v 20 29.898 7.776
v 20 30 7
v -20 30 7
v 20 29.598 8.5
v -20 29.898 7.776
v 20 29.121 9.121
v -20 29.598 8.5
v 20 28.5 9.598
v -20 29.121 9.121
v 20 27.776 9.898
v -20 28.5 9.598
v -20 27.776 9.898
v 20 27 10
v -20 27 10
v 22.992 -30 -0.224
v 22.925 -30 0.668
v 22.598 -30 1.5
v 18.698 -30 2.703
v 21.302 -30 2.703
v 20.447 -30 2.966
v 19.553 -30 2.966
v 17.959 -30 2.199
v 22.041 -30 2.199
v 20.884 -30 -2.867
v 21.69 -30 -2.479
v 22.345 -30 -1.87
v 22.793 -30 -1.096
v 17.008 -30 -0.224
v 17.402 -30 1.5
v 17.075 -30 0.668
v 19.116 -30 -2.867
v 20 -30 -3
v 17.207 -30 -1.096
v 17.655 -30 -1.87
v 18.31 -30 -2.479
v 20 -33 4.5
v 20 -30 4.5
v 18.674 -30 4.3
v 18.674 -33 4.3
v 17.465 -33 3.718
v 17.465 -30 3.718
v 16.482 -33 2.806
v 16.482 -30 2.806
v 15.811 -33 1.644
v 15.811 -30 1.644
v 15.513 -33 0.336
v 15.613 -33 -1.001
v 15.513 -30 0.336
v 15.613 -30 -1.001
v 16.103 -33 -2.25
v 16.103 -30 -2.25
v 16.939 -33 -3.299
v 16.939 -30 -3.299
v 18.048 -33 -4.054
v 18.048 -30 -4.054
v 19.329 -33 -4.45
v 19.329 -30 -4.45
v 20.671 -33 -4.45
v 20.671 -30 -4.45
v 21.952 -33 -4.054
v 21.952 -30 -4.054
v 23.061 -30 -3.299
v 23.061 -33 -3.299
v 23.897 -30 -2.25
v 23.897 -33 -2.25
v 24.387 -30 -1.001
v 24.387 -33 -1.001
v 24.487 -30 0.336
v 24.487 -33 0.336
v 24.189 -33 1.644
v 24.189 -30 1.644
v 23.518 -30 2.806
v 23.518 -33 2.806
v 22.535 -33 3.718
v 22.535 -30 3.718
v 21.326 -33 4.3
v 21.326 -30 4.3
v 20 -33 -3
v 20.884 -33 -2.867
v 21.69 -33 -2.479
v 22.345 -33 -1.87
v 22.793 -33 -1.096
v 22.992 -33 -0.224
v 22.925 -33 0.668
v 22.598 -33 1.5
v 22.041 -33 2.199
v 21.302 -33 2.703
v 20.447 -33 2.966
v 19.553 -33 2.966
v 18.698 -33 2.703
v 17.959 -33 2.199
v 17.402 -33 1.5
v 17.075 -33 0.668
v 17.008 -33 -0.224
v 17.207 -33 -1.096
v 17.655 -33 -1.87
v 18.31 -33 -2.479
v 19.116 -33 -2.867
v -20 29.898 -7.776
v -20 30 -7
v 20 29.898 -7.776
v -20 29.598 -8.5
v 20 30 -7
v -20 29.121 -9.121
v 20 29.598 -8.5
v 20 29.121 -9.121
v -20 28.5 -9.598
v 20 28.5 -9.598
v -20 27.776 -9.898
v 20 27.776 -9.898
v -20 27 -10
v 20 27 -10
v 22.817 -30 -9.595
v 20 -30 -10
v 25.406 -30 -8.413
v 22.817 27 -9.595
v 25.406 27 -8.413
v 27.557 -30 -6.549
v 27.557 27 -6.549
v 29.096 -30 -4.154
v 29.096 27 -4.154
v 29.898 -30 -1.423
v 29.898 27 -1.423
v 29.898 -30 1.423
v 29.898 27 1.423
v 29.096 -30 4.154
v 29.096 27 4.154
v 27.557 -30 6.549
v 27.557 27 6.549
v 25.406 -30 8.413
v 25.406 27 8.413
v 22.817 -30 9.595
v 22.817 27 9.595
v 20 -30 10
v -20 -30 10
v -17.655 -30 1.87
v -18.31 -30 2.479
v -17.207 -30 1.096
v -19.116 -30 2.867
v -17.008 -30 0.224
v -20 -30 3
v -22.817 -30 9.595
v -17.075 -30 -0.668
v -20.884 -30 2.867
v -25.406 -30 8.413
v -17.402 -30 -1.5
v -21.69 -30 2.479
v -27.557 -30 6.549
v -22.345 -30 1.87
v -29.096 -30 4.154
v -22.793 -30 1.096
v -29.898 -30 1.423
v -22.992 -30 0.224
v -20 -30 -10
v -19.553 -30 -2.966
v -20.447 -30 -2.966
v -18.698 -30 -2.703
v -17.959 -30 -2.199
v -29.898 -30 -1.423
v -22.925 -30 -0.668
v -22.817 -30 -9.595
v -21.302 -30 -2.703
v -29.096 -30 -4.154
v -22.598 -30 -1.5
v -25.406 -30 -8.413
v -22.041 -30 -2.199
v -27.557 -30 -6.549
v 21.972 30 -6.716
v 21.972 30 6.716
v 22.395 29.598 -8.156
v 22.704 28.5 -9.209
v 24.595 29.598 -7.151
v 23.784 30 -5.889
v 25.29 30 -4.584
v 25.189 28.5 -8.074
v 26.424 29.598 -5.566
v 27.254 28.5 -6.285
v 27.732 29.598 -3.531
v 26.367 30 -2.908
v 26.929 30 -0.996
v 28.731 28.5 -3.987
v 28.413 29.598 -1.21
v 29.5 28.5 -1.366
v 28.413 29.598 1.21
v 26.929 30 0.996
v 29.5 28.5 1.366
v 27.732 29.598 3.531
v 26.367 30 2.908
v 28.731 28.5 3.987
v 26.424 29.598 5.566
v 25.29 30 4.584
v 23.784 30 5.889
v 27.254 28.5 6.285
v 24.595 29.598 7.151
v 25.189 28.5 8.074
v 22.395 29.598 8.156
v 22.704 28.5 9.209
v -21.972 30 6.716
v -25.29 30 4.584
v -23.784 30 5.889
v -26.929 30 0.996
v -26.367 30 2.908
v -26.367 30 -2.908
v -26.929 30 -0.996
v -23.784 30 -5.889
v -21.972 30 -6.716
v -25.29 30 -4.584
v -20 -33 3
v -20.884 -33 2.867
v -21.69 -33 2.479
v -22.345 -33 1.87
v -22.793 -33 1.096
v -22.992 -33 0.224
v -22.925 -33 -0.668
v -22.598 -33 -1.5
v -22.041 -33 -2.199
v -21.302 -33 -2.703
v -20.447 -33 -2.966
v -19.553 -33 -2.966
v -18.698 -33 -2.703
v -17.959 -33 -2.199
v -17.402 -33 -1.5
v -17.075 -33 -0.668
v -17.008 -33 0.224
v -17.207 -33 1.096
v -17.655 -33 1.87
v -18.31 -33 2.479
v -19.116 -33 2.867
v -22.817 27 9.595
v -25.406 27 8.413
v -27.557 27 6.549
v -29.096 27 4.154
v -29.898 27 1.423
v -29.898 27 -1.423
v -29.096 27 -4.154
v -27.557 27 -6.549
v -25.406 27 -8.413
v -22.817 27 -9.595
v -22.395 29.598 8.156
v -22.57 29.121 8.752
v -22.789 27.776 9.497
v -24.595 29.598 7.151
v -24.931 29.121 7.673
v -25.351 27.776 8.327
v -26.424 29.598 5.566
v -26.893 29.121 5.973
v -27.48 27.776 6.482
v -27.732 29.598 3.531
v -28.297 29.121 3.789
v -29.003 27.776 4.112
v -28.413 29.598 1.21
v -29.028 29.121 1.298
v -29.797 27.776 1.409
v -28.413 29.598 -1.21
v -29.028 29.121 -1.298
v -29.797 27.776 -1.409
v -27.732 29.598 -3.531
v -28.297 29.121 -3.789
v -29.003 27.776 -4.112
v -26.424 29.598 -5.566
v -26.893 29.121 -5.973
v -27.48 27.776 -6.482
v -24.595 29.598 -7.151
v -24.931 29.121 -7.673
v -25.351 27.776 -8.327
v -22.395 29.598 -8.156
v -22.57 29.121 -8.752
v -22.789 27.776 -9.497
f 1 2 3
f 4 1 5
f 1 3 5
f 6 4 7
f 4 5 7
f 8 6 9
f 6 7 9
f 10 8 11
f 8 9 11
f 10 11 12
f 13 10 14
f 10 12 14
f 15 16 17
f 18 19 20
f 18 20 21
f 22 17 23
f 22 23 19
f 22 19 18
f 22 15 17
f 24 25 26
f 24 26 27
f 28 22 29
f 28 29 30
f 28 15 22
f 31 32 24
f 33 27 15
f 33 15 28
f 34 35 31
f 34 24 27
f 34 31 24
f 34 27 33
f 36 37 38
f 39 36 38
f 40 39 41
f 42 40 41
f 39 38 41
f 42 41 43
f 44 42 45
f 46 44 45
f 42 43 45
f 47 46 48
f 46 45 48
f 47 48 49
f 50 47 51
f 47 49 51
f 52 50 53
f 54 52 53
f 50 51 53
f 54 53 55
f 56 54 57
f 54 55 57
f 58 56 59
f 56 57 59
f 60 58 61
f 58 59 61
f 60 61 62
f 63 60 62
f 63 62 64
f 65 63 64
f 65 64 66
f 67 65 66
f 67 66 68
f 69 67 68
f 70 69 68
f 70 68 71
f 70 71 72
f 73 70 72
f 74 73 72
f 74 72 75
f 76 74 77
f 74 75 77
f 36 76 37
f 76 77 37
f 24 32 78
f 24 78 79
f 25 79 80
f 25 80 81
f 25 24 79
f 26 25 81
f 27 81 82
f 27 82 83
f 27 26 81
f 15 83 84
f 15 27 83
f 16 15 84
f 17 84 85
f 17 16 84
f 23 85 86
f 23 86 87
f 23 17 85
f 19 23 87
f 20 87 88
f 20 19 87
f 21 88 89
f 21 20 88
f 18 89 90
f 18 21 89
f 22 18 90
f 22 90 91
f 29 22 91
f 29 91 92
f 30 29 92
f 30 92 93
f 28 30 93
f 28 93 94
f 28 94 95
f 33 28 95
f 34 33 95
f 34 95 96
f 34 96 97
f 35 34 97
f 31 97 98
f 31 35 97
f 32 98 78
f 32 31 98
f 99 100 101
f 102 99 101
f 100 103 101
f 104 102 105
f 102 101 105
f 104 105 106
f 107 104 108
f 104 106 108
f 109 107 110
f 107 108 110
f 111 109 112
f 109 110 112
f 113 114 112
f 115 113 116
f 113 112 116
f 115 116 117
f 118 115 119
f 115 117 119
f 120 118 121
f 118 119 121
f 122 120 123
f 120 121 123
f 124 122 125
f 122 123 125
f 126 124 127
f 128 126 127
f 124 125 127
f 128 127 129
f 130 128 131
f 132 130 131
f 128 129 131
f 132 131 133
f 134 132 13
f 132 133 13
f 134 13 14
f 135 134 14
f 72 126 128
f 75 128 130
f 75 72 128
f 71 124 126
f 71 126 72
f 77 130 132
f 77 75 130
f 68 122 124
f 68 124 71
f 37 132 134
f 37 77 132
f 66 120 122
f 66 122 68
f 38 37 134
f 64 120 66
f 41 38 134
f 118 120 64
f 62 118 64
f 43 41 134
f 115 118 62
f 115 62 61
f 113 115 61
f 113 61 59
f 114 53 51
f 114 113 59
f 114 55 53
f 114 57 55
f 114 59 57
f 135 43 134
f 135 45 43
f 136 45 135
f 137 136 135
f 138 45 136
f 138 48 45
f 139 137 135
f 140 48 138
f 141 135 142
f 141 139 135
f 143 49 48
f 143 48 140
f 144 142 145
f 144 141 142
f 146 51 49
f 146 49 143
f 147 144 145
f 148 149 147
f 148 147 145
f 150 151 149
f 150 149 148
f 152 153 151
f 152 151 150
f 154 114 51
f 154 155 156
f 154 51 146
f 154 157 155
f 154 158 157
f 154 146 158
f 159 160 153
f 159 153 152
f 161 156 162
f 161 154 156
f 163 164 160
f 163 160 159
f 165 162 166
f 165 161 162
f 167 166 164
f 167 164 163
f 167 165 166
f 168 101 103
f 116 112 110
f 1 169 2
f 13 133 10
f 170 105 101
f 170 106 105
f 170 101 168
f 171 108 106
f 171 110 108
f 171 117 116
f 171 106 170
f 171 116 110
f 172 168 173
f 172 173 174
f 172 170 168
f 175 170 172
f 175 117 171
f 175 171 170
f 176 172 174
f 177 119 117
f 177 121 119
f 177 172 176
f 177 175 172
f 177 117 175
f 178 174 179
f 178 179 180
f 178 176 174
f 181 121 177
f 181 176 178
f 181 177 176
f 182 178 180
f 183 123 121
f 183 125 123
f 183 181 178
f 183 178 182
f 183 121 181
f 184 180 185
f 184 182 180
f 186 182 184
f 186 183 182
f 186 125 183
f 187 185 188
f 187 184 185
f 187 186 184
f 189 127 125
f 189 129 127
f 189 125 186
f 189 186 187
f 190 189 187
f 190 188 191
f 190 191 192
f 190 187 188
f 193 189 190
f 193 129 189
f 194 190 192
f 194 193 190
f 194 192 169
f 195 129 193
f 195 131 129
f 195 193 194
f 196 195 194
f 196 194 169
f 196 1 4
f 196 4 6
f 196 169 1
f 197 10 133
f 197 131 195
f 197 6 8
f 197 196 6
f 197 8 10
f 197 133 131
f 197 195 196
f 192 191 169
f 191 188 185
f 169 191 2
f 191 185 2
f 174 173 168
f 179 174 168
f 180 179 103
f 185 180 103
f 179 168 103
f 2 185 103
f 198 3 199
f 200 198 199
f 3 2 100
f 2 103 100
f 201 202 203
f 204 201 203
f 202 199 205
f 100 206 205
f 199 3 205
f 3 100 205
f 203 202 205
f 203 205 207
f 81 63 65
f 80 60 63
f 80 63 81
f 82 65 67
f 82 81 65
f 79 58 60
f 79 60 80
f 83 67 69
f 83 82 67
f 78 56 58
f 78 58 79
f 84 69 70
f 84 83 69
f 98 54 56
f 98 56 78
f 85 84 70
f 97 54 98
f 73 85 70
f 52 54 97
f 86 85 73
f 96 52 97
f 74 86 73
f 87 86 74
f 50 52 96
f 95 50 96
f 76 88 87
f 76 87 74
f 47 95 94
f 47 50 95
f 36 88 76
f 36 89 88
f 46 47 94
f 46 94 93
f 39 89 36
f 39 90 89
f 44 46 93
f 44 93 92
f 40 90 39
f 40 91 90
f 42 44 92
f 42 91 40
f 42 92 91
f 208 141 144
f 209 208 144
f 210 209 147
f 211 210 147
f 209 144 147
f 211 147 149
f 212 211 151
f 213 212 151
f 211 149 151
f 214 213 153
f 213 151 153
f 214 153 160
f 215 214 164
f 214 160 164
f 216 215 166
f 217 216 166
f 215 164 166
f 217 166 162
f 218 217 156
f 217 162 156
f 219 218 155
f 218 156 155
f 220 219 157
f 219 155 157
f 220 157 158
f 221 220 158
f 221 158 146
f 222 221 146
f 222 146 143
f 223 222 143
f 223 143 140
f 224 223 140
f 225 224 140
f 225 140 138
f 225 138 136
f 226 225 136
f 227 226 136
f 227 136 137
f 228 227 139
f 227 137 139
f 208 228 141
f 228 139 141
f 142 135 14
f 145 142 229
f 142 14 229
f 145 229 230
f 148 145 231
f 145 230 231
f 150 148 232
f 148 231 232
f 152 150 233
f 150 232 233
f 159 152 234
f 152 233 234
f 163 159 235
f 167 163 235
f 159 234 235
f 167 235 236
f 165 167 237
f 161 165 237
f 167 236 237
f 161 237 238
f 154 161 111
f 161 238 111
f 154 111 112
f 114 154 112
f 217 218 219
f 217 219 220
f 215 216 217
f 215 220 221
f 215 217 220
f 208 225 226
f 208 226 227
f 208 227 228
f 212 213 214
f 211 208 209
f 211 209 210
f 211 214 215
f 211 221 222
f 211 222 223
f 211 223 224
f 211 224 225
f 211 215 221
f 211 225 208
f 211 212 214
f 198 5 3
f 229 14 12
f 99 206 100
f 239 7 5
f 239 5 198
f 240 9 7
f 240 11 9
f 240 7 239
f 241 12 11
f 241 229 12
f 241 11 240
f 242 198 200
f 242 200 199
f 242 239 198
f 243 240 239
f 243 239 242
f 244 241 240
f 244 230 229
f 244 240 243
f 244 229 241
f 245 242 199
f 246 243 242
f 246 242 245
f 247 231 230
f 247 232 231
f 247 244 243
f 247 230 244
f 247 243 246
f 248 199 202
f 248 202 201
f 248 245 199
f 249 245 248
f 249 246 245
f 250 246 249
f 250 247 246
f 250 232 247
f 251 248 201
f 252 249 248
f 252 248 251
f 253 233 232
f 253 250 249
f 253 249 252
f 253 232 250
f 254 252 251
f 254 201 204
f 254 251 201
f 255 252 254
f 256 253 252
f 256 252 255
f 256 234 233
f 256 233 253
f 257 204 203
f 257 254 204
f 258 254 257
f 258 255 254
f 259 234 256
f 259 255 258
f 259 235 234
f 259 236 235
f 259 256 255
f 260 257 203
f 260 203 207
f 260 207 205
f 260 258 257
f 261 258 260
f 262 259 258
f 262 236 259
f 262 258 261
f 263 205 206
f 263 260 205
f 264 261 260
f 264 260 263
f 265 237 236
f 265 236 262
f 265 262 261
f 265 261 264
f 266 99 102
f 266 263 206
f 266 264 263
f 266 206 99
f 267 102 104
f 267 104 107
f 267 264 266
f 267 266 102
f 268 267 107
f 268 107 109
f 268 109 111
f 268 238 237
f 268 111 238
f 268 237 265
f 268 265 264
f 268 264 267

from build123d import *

# Parameters (mm, degrees)
EXTRUDE_1_DEPTH = 30
FILLET_1_R      = 3
SKETCH_2_R      = 3
SKETCH_2_R_2    = 4.5
EXTRUDE_2_DEPTH = 3


with BuildPart() as part:
    # 草图1 → 凸台-拉伸1 (new, symmetric)
    with BuildSketch(Plane(origin=(0, 0, 0), x_dir=(1, 0, 0), z_dir=(0, 1, 0))):
        with BuildLine():
            Line((-20, 10), (20, 10))
            ThreePointArc((20, 10), (30, 0), (20, -10))
            Line((20, -10), (-20, -10))
            ThreePointArc((-20, -10), (-30, 0), (-20, 10))
        make_face()
    extrude(amount=EXTRUDE_1_DEPTH, both=True)

    # 圆角1
    fillet_1_edges = [part.edges().sort_by_distance(p)[0] for p in [
        (30, 30, 0),
        (0, 30, -10),
        (-30, 30, 0),
        (0, 30, 10),
    ]]
    fillet(fillet_1_edges, radius=FILLET_1_R)

    # 草图2 → 凸台-拉伸2 (add)
    # profile 1 of 2: a face of its own
    with BuildSketch(Plane.XZ.offset(30)):
        with Locations(Location((-20, 0, 0), (0, 0, 90))):
            Circle(SKETCH_2_R)
    # profile 2 of 2: a face of its own
    with BuildSketch(Plane.XZ.offset(30)):
        with Locations(Location((20, 0, 0), (0, 0, 90))):
            Circle(SKETCH_2_R_2)
        with Locations(Location((20, 0, 0), (0, 0, 270))):
            Circle(SKETCH_2_R, mode=Mode.SUBTRACT)
    extrude(amount=EXTRUDE_2_DEPTH)


solid = part.part
